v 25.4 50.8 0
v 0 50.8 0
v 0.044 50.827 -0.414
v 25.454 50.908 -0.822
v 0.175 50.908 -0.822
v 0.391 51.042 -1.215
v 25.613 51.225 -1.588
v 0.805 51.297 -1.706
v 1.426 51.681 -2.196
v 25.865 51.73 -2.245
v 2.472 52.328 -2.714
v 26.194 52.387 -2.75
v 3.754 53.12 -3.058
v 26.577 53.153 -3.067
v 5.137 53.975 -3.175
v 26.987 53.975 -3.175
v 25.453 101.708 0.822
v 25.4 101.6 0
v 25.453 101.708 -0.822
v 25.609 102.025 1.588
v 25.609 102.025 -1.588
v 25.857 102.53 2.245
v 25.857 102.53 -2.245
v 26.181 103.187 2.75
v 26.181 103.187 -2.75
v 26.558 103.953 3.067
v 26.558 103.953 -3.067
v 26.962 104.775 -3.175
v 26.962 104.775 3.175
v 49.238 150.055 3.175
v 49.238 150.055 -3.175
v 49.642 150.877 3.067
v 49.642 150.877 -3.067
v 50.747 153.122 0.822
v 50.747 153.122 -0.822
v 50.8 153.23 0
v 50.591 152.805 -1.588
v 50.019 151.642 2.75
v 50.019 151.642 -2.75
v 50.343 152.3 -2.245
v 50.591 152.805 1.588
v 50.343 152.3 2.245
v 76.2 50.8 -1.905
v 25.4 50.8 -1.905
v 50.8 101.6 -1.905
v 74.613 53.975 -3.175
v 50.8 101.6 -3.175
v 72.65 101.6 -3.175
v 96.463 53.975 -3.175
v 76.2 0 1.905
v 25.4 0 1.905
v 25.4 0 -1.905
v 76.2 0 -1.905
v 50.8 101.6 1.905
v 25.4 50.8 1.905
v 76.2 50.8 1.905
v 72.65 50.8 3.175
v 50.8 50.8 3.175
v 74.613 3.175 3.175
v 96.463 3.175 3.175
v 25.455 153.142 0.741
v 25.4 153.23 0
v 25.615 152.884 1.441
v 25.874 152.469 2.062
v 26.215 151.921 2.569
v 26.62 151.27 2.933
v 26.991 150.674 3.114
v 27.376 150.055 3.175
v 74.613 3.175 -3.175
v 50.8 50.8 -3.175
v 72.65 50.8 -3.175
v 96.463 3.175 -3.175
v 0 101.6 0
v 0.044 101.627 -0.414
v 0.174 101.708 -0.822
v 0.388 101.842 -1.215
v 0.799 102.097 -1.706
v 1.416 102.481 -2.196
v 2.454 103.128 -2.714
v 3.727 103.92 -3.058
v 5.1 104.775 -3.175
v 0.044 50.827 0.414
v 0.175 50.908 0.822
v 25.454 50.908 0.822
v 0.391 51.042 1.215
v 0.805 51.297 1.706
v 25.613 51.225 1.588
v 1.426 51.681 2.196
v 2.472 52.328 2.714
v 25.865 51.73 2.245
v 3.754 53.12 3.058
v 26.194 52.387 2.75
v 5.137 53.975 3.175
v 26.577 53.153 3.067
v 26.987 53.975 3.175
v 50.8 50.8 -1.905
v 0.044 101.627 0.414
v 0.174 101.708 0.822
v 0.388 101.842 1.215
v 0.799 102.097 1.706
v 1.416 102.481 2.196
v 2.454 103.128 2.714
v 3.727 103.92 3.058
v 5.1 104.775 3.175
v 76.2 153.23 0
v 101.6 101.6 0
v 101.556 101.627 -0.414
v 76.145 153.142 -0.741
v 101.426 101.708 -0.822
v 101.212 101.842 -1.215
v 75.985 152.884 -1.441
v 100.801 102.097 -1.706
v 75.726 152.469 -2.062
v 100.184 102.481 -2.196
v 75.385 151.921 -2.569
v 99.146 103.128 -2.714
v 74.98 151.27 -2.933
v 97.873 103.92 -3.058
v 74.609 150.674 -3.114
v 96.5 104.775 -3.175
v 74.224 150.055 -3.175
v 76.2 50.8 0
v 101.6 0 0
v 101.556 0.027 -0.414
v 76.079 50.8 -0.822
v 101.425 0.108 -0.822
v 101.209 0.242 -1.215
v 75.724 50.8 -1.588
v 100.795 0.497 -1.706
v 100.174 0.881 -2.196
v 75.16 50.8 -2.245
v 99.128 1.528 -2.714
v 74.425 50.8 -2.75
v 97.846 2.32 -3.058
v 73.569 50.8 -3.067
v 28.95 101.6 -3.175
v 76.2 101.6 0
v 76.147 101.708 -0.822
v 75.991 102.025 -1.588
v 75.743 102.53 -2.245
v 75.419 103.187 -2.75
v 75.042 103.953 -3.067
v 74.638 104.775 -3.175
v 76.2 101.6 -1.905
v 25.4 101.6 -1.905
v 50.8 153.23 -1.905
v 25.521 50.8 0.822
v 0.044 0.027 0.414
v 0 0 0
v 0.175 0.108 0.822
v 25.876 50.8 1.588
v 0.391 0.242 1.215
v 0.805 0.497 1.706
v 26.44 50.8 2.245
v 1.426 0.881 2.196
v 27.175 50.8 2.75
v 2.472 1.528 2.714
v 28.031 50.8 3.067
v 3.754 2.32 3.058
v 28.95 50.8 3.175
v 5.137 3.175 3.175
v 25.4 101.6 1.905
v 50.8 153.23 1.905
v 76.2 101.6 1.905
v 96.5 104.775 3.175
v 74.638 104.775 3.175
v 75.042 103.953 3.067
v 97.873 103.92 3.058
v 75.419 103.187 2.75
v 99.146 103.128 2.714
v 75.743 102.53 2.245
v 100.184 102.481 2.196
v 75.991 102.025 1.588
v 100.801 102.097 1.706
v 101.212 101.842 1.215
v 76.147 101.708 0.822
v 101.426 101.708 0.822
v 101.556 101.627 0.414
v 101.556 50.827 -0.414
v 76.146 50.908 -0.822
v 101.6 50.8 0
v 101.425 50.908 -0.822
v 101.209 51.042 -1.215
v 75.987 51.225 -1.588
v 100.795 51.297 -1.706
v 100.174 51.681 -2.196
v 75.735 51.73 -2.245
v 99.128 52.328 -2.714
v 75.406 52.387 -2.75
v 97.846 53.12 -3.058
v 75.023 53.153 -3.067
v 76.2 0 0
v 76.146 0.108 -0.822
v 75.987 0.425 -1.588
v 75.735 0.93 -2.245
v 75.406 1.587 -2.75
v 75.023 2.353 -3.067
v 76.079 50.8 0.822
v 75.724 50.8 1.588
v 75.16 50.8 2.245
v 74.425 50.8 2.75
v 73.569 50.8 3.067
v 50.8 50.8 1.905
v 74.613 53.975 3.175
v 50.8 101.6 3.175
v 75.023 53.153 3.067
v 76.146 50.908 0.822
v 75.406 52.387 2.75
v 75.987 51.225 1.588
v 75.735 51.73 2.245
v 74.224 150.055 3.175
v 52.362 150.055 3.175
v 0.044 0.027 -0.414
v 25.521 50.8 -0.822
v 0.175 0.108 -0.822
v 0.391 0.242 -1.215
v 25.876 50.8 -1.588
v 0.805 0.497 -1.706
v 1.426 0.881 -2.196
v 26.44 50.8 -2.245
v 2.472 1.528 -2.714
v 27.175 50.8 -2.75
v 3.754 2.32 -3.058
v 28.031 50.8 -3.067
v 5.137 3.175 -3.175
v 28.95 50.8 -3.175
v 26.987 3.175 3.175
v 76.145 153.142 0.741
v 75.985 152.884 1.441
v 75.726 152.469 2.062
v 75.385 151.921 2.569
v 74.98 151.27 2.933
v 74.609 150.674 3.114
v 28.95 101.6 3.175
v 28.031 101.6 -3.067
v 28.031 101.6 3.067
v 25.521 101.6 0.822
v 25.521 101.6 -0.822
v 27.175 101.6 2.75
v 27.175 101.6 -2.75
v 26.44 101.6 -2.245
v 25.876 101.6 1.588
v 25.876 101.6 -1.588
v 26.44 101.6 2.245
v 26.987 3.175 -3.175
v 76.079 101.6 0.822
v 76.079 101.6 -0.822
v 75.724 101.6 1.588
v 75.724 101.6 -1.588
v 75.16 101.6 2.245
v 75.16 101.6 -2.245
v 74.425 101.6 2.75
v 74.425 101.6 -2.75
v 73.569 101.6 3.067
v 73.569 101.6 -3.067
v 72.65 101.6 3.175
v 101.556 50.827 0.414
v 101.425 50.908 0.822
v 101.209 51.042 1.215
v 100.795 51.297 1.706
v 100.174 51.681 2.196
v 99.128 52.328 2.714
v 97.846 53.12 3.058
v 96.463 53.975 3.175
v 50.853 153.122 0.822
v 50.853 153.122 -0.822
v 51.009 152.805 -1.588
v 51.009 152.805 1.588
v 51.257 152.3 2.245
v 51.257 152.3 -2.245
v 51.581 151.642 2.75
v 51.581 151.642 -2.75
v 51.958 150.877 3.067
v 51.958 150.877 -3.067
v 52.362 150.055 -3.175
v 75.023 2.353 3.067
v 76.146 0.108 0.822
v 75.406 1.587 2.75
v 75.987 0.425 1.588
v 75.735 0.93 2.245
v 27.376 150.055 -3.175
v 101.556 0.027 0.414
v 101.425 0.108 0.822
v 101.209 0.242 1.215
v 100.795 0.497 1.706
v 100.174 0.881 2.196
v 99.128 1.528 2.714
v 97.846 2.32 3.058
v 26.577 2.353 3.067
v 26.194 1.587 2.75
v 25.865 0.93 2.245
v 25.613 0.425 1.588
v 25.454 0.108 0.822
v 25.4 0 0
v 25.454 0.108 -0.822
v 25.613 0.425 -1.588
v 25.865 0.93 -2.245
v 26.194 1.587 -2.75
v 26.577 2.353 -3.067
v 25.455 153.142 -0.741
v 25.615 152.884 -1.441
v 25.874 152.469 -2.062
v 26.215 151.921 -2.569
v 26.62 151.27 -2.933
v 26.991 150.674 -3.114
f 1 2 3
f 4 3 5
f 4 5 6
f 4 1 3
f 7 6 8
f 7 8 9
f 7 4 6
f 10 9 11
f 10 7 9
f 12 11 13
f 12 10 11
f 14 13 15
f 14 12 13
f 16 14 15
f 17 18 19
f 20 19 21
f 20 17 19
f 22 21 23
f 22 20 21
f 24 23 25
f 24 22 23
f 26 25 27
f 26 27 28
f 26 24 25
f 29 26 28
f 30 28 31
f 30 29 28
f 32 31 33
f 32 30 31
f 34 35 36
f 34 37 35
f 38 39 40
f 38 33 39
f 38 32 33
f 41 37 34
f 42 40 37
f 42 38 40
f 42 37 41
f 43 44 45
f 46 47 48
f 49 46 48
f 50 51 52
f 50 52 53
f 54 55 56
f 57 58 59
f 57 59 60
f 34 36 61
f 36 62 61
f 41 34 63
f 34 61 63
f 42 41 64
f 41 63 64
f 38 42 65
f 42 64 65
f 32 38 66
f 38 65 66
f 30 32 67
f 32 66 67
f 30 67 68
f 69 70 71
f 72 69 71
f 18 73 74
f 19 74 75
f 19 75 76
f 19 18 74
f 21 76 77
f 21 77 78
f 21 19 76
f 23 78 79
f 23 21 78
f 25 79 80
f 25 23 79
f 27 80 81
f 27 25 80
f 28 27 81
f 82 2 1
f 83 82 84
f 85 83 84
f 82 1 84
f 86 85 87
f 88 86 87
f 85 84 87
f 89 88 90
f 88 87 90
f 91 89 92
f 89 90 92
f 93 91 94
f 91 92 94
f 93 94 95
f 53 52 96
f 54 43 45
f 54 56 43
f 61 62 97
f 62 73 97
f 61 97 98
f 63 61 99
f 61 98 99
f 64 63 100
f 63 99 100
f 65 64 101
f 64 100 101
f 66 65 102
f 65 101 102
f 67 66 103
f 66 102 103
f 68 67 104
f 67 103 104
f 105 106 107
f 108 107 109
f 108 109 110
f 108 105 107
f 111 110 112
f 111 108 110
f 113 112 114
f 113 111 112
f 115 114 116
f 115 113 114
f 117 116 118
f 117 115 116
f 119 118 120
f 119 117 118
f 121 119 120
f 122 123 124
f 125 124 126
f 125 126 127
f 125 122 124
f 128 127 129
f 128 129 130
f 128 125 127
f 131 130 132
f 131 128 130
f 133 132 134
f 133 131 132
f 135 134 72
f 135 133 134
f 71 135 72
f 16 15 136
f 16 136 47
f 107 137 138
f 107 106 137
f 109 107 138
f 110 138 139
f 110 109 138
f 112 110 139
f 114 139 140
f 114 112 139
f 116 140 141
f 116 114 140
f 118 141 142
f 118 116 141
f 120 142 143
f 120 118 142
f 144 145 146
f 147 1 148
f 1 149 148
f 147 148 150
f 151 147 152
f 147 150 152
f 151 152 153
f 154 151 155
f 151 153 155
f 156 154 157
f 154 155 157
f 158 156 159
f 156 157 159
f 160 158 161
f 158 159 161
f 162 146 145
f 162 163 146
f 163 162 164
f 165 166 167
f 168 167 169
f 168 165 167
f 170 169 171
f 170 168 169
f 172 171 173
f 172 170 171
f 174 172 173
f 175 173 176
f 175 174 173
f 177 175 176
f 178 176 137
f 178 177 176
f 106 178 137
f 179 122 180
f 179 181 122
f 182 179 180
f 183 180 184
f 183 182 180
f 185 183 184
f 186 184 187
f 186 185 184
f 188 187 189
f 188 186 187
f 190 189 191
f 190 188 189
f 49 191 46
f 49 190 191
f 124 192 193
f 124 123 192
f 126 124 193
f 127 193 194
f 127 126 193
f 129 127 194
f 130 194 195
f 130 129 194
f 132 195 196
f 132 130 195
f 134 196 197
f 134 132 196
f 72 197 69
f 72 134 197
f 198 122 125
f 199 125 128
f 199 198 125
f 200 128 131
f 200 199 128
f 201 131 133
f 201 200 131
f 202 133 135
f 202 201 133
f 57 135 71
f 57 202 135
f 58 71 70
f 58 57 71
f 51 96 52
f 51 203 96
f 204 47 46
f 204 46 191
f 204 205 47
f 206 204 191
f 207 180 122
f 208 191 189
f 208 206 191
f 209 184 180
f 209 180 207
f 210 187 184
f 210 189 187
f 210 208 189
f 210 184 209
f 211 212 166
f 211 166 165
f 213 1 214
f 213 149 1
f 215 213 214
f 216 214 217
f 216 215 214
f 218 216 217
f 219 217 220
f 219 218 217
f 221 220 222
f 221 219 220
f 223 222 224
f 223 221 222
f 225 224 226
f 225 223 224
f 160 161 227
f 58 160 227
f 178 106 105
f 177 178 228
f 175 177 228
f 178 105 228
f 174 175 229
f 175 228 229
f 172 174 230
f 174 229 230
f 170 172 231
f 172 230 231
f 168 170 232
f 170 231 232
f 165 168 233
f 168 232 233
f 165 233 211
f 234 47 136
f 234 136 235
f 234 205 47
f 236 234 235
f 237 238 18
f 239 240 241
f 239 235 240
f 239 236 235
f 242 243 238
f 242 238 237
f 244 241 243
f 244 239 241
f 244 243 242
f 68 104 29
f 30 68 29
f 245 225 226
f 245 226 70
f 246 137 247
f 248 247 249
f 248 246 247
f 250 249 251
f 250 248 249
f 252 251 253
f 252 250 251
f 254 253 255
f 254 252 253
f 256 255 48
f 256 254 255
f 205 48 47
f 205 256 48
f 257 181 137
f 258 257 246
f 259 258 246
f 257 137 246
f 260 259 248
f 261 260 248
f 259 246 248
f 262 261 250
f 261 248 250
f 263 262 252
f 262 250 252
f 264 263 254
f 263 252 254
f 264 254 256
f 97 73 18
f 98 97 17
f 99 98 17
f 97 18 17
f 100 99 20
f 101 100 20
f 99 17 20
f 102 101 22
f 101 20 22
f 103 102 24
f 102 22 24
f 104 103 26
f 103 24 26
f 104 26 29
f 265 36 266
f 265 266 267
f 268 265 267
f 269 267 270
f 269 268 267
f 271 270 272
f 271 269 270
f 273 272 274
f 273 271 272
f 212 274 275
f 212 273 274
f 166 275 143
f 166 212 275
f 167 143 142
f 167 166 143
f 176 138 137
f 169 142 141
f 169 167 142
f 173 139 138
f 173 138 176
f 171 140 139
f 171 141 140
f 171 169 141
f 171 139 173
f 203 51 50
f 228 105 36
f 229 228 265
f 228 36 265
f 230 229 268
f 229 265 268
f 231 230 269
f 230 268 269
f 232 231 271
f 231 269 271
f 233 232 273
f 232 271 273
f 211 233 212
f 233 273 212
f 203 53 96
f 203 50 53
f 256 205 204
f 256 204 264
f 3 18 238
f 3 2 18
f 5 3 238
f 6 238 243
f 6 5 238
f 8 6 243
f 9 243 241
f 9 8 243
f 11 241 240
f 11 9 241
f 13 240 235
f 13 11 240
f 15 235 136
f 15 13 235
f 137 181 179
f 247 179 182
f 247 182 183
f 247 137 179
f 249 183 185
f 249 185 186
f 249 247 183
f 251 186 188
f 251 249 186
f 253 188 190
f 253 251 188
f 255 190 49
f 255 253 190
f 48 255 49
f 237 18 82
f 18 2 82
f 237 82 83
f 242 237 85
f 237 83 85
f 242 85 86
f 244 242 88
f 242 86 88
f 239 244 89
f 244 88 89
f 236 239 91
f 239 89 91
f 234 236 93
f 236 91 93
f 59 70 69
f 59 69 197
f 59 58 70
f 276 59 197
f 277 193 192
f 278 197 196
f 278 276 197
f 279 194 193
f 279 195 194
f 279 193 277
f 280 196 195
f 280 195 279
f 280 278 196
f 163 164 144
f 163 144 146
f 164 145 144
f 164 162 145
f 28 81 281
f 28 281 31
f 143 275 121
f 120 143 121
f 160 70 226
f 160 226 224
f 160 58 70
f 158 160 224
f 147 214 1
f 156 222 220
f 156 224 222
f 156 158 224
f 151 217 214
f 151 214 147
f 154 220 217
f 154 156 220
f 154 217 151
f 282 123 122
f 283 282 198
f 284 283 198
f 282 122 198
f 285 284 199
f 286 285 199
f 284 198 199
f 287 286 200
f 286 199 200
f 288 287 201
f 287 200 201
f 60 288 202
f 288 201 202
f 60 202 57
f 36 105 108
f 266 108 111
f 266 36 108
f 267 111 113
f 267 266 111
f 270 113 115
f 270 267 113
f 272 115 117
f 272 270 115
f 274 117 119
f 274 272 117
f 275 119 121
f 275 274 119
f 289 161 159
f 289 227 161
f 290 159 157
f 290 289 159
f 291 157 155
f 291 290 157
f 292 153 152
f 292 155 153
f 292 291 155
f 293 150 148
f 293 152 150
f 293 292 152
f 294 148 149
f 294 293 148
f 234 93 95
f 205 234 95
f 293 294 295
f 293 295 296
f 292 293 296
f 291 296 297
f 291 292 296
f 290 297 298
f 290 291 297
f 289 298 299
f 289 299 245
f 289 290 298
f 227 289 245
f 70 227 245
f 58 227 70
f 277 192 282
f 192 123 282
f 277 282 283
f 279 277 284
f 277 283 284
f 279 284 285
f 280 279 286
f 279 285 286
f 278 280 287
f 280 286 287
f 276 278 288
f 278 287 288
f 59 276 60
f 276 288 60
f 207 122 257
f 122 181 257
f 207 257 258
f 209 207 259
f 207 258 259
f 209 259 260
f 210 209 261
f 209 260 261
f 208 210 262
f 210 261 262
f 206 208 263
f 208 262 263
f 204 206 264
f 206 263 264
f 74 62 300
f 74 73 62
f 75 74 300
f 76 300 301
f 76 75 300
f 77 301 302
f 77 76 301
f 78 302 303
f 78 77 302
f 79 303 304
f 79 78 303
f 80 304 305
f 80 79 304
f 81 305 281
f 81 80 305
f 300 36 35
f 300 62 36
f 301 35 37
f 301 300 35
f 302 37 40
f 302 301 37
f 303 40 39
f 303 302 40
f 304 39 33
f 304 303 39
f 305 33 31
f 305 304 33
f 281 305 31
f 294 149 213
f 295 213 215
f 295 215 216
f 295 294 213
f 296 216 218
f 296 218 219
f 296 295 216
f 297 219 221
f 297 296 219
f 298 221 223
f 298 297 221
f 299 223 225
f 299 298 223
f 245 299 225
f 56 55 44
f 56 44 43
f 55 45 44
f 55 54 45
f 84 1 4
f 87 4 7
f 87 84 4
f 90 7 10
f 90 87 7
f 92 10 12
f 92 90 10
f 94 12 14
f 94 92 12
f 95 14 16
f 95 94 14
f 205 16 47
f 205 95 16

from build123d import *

# Parameters (mm, degrees)
F1_DEPTH = 3.175
F2_DEPTH = 1.905
F3_R     = 3.17499
F3_2_R   = 3.17499
F3_3_R   = 3.17499
F3_4_R   = 3.17499
F3_5_R   = 3.17499
F3_6_R   = 3.17499


# Not quite as in the source:
# - a fillet or chamfer is up to 0.001 mm smaller than in the source, because OpenCascade refuses the exact size


with BuildPart() as f1:
    # F0 (on Top) → F1 (new body, symmetric)
    with BuildSketch(Plane.XY):
        Polygon((0, 101.6), (25.4, 101.6), (50.8, 153.2299369574), (25.4, 153.2299369574), align=None)
    extrude(amount=F1_DEPTH, both=True)

    # F3#3 (radius 3.175 in the source; OpenCascade refuses exactly that, so slightly less here)
    f3_3_edges = [f1.edges().sort_by_distance(p)[0] for p in [
        (12.7, 127.414968, 3.175),
        (12.7, 127.414968, -3.175),
        (38.1, 153.229937, -3.175),
        (38.1, 153.229937, 3.175),
        (12.7, 101.6, 3.175),
        (12.7, 101.6, -3.175),
    ]]
    fillet(f3_3_edges, radius=F3_3_R)


with BuildPart() as f1b:
    # F0 (on Top) → F1, piece 2 (new body, symmetric)
    with BuildSketch(Plane.XY):
        Polygon((50.8, 153.2299369574), (76.2, 101.6), (101.6, 101.6), (76.2, 153.2299369574), align=None)
    extrude(amount=F1_DEPTH, both=True)

    # F3#4 (radius 3.175 in the source; OpenCascade refuses exactly that, so slightly less here)
    f3_4_edges = [f1b.edges().sort_by_distance(p)[0] for p in [
        (88.9, 127.414968, 3.175),
        (88.9, 127.414968, -3.175),
        (63.5, 153.229937, 3.175),
        (63.5, 153.229937, -3.175),
        (88.9, 101.6, 3.175),
        (88.9, 101.6, -3.175),
    ]]
    fillet(f3_4_edges, radius=F3_4_R)


with BuildPart() as f1c:
    # F0 (on Top) → F1, piece 3 (new body, symmetric)
    with BuildSketch(Plane.XY):
        Polygon((76.2, 101.6), (50.8, 101.6), (76.2, 50.8), (101.6, 50.8), align=None)
    extrude(amount=F1_DEPTH, both=True)

    # F3#5 (radius 3.175 in the source; OpenCascade refuses exactly that, so slightly less here)
    f3_5_edges = [f1c.edges().sort_by_distance(p)[0] for p in [
        (88.9, 76.2, 3.175),
        (88.9, 76.2, -3.175),
        (88.9, 50.8, -3.175),
        (88.9, 50.8, 3.175),
    ]]
    fillet(f3_5_edges, radius=F3_5_R)


with BuildPart() as f1d:
    # F0 (on Top) → F1, piece 4 (new body, symmetric)
    with BuildSketch(Plane.XY):
        Polygon((0, 50.8), (25.4, 50.8), (50.8, 101.6), (25.4, 101.6), align=None)
    extrude(amount=F1_DEPTH, both=True)

    # F3#2 (radius 3.175 in the source; OpenCascade refuses exactly that, so slightly less here)
    f3_2_edges = [f1d.edges().sort_by_distance(p)[0] for p in [
        (12.7, 76.2, 3.175),
        (12.7, 76.2, -3.175),
        (12.7, 50.8, 3.175),
        (12.7, 50.8, -3.175),
    ]]
    fillet(f3_2_edges, radius=F3_2_R)


with BuildPart() as f1e:
    # F0 (on Top) → F1, piece 5 (new body, symmetric)
    with BuildSketch(Plane.XY):
        Polygon((25.4, 50.8), (0, 0), (25.4, 0), (50.8, 50.8), align=None)
    extrude(amount=F1_DEPTH, both=True)

    # F3 (radius 3.175 in the source; OpenCascade refuses exactly that, so slightly less here)
    f3_edges = [f1e.edges().sort_by_distance(p)[0] for p in [
        (12.7, 25.4, 3.175),
        (12.7, 25.4, -3.175),
        (12.7, 0, 3.175),
        (12.7, 0, -3.175),
    ]]
    fillet(f3_edges, radius=F3_R)


with BuildPart() as f1f:
    # F0 (on Top) → F1, piece 6 (new body, symmetric)
    with BuildSketch(Plane.XY):
        Polygon((76.2, 50.8), (50.8, 50.8), (76.2, 0), (101.6, 0), align=None)
    extrude(amount=F1_DEPTH, both=True)

    # F3#6 (radius 3.175 in the source; OpenCascade refuses exactly that, so slightly less here)
    f3_6_edges = [f1f.edges().sort_by_distance(p)[0] for p in [
        (88.9, 25.4, 3.175),
        (88.9, 25.4, -3.175),
        (88.9, 0, 3.175),
        (88.9, 0, -3.175),
    ]]
    fillet(f3_6_edges, radius=F3_6_R)


with BuildPart() as f2:
    # F0 (on Top) → F2 (new body, symmetric)
    with BuildSketch(Plane.XY):
        Polygon((25.4, 101.6), (50.8, 101.6), (76.2, 101.6), (50.8, 153.2299369574), align=None)
    extrude(amount=F2_DEPTH, both=True)


with BuildPart() as f2b:
    # F0 (on Top) → F2, piece 2 (new body, symmetric)
    with BuildSketch(Plane.XY):
        Polygon((50.8, 101.6), (25.4, 50.8), (50.8, 50.8), (76.2, 50.8), align=None)
    extrude(amount=F2_DEPTH, both=True)


with BuildPart() as f2c:
    # F0 (on Top) → F2, piece 3 (new body, symmetric)
    with BuildSketch(Plane.XY):
        Polygon((50.8, 50.8), (25.4, 0), (76.2, 0), align=None)
    extrude(amount=F2_DEPTH, both=True)


solid = Compound([f1.part, f1b.part, f1c.part, f1d.part, f1e.part, f1f.part, f2.part, f2b.part, f2c.part])
